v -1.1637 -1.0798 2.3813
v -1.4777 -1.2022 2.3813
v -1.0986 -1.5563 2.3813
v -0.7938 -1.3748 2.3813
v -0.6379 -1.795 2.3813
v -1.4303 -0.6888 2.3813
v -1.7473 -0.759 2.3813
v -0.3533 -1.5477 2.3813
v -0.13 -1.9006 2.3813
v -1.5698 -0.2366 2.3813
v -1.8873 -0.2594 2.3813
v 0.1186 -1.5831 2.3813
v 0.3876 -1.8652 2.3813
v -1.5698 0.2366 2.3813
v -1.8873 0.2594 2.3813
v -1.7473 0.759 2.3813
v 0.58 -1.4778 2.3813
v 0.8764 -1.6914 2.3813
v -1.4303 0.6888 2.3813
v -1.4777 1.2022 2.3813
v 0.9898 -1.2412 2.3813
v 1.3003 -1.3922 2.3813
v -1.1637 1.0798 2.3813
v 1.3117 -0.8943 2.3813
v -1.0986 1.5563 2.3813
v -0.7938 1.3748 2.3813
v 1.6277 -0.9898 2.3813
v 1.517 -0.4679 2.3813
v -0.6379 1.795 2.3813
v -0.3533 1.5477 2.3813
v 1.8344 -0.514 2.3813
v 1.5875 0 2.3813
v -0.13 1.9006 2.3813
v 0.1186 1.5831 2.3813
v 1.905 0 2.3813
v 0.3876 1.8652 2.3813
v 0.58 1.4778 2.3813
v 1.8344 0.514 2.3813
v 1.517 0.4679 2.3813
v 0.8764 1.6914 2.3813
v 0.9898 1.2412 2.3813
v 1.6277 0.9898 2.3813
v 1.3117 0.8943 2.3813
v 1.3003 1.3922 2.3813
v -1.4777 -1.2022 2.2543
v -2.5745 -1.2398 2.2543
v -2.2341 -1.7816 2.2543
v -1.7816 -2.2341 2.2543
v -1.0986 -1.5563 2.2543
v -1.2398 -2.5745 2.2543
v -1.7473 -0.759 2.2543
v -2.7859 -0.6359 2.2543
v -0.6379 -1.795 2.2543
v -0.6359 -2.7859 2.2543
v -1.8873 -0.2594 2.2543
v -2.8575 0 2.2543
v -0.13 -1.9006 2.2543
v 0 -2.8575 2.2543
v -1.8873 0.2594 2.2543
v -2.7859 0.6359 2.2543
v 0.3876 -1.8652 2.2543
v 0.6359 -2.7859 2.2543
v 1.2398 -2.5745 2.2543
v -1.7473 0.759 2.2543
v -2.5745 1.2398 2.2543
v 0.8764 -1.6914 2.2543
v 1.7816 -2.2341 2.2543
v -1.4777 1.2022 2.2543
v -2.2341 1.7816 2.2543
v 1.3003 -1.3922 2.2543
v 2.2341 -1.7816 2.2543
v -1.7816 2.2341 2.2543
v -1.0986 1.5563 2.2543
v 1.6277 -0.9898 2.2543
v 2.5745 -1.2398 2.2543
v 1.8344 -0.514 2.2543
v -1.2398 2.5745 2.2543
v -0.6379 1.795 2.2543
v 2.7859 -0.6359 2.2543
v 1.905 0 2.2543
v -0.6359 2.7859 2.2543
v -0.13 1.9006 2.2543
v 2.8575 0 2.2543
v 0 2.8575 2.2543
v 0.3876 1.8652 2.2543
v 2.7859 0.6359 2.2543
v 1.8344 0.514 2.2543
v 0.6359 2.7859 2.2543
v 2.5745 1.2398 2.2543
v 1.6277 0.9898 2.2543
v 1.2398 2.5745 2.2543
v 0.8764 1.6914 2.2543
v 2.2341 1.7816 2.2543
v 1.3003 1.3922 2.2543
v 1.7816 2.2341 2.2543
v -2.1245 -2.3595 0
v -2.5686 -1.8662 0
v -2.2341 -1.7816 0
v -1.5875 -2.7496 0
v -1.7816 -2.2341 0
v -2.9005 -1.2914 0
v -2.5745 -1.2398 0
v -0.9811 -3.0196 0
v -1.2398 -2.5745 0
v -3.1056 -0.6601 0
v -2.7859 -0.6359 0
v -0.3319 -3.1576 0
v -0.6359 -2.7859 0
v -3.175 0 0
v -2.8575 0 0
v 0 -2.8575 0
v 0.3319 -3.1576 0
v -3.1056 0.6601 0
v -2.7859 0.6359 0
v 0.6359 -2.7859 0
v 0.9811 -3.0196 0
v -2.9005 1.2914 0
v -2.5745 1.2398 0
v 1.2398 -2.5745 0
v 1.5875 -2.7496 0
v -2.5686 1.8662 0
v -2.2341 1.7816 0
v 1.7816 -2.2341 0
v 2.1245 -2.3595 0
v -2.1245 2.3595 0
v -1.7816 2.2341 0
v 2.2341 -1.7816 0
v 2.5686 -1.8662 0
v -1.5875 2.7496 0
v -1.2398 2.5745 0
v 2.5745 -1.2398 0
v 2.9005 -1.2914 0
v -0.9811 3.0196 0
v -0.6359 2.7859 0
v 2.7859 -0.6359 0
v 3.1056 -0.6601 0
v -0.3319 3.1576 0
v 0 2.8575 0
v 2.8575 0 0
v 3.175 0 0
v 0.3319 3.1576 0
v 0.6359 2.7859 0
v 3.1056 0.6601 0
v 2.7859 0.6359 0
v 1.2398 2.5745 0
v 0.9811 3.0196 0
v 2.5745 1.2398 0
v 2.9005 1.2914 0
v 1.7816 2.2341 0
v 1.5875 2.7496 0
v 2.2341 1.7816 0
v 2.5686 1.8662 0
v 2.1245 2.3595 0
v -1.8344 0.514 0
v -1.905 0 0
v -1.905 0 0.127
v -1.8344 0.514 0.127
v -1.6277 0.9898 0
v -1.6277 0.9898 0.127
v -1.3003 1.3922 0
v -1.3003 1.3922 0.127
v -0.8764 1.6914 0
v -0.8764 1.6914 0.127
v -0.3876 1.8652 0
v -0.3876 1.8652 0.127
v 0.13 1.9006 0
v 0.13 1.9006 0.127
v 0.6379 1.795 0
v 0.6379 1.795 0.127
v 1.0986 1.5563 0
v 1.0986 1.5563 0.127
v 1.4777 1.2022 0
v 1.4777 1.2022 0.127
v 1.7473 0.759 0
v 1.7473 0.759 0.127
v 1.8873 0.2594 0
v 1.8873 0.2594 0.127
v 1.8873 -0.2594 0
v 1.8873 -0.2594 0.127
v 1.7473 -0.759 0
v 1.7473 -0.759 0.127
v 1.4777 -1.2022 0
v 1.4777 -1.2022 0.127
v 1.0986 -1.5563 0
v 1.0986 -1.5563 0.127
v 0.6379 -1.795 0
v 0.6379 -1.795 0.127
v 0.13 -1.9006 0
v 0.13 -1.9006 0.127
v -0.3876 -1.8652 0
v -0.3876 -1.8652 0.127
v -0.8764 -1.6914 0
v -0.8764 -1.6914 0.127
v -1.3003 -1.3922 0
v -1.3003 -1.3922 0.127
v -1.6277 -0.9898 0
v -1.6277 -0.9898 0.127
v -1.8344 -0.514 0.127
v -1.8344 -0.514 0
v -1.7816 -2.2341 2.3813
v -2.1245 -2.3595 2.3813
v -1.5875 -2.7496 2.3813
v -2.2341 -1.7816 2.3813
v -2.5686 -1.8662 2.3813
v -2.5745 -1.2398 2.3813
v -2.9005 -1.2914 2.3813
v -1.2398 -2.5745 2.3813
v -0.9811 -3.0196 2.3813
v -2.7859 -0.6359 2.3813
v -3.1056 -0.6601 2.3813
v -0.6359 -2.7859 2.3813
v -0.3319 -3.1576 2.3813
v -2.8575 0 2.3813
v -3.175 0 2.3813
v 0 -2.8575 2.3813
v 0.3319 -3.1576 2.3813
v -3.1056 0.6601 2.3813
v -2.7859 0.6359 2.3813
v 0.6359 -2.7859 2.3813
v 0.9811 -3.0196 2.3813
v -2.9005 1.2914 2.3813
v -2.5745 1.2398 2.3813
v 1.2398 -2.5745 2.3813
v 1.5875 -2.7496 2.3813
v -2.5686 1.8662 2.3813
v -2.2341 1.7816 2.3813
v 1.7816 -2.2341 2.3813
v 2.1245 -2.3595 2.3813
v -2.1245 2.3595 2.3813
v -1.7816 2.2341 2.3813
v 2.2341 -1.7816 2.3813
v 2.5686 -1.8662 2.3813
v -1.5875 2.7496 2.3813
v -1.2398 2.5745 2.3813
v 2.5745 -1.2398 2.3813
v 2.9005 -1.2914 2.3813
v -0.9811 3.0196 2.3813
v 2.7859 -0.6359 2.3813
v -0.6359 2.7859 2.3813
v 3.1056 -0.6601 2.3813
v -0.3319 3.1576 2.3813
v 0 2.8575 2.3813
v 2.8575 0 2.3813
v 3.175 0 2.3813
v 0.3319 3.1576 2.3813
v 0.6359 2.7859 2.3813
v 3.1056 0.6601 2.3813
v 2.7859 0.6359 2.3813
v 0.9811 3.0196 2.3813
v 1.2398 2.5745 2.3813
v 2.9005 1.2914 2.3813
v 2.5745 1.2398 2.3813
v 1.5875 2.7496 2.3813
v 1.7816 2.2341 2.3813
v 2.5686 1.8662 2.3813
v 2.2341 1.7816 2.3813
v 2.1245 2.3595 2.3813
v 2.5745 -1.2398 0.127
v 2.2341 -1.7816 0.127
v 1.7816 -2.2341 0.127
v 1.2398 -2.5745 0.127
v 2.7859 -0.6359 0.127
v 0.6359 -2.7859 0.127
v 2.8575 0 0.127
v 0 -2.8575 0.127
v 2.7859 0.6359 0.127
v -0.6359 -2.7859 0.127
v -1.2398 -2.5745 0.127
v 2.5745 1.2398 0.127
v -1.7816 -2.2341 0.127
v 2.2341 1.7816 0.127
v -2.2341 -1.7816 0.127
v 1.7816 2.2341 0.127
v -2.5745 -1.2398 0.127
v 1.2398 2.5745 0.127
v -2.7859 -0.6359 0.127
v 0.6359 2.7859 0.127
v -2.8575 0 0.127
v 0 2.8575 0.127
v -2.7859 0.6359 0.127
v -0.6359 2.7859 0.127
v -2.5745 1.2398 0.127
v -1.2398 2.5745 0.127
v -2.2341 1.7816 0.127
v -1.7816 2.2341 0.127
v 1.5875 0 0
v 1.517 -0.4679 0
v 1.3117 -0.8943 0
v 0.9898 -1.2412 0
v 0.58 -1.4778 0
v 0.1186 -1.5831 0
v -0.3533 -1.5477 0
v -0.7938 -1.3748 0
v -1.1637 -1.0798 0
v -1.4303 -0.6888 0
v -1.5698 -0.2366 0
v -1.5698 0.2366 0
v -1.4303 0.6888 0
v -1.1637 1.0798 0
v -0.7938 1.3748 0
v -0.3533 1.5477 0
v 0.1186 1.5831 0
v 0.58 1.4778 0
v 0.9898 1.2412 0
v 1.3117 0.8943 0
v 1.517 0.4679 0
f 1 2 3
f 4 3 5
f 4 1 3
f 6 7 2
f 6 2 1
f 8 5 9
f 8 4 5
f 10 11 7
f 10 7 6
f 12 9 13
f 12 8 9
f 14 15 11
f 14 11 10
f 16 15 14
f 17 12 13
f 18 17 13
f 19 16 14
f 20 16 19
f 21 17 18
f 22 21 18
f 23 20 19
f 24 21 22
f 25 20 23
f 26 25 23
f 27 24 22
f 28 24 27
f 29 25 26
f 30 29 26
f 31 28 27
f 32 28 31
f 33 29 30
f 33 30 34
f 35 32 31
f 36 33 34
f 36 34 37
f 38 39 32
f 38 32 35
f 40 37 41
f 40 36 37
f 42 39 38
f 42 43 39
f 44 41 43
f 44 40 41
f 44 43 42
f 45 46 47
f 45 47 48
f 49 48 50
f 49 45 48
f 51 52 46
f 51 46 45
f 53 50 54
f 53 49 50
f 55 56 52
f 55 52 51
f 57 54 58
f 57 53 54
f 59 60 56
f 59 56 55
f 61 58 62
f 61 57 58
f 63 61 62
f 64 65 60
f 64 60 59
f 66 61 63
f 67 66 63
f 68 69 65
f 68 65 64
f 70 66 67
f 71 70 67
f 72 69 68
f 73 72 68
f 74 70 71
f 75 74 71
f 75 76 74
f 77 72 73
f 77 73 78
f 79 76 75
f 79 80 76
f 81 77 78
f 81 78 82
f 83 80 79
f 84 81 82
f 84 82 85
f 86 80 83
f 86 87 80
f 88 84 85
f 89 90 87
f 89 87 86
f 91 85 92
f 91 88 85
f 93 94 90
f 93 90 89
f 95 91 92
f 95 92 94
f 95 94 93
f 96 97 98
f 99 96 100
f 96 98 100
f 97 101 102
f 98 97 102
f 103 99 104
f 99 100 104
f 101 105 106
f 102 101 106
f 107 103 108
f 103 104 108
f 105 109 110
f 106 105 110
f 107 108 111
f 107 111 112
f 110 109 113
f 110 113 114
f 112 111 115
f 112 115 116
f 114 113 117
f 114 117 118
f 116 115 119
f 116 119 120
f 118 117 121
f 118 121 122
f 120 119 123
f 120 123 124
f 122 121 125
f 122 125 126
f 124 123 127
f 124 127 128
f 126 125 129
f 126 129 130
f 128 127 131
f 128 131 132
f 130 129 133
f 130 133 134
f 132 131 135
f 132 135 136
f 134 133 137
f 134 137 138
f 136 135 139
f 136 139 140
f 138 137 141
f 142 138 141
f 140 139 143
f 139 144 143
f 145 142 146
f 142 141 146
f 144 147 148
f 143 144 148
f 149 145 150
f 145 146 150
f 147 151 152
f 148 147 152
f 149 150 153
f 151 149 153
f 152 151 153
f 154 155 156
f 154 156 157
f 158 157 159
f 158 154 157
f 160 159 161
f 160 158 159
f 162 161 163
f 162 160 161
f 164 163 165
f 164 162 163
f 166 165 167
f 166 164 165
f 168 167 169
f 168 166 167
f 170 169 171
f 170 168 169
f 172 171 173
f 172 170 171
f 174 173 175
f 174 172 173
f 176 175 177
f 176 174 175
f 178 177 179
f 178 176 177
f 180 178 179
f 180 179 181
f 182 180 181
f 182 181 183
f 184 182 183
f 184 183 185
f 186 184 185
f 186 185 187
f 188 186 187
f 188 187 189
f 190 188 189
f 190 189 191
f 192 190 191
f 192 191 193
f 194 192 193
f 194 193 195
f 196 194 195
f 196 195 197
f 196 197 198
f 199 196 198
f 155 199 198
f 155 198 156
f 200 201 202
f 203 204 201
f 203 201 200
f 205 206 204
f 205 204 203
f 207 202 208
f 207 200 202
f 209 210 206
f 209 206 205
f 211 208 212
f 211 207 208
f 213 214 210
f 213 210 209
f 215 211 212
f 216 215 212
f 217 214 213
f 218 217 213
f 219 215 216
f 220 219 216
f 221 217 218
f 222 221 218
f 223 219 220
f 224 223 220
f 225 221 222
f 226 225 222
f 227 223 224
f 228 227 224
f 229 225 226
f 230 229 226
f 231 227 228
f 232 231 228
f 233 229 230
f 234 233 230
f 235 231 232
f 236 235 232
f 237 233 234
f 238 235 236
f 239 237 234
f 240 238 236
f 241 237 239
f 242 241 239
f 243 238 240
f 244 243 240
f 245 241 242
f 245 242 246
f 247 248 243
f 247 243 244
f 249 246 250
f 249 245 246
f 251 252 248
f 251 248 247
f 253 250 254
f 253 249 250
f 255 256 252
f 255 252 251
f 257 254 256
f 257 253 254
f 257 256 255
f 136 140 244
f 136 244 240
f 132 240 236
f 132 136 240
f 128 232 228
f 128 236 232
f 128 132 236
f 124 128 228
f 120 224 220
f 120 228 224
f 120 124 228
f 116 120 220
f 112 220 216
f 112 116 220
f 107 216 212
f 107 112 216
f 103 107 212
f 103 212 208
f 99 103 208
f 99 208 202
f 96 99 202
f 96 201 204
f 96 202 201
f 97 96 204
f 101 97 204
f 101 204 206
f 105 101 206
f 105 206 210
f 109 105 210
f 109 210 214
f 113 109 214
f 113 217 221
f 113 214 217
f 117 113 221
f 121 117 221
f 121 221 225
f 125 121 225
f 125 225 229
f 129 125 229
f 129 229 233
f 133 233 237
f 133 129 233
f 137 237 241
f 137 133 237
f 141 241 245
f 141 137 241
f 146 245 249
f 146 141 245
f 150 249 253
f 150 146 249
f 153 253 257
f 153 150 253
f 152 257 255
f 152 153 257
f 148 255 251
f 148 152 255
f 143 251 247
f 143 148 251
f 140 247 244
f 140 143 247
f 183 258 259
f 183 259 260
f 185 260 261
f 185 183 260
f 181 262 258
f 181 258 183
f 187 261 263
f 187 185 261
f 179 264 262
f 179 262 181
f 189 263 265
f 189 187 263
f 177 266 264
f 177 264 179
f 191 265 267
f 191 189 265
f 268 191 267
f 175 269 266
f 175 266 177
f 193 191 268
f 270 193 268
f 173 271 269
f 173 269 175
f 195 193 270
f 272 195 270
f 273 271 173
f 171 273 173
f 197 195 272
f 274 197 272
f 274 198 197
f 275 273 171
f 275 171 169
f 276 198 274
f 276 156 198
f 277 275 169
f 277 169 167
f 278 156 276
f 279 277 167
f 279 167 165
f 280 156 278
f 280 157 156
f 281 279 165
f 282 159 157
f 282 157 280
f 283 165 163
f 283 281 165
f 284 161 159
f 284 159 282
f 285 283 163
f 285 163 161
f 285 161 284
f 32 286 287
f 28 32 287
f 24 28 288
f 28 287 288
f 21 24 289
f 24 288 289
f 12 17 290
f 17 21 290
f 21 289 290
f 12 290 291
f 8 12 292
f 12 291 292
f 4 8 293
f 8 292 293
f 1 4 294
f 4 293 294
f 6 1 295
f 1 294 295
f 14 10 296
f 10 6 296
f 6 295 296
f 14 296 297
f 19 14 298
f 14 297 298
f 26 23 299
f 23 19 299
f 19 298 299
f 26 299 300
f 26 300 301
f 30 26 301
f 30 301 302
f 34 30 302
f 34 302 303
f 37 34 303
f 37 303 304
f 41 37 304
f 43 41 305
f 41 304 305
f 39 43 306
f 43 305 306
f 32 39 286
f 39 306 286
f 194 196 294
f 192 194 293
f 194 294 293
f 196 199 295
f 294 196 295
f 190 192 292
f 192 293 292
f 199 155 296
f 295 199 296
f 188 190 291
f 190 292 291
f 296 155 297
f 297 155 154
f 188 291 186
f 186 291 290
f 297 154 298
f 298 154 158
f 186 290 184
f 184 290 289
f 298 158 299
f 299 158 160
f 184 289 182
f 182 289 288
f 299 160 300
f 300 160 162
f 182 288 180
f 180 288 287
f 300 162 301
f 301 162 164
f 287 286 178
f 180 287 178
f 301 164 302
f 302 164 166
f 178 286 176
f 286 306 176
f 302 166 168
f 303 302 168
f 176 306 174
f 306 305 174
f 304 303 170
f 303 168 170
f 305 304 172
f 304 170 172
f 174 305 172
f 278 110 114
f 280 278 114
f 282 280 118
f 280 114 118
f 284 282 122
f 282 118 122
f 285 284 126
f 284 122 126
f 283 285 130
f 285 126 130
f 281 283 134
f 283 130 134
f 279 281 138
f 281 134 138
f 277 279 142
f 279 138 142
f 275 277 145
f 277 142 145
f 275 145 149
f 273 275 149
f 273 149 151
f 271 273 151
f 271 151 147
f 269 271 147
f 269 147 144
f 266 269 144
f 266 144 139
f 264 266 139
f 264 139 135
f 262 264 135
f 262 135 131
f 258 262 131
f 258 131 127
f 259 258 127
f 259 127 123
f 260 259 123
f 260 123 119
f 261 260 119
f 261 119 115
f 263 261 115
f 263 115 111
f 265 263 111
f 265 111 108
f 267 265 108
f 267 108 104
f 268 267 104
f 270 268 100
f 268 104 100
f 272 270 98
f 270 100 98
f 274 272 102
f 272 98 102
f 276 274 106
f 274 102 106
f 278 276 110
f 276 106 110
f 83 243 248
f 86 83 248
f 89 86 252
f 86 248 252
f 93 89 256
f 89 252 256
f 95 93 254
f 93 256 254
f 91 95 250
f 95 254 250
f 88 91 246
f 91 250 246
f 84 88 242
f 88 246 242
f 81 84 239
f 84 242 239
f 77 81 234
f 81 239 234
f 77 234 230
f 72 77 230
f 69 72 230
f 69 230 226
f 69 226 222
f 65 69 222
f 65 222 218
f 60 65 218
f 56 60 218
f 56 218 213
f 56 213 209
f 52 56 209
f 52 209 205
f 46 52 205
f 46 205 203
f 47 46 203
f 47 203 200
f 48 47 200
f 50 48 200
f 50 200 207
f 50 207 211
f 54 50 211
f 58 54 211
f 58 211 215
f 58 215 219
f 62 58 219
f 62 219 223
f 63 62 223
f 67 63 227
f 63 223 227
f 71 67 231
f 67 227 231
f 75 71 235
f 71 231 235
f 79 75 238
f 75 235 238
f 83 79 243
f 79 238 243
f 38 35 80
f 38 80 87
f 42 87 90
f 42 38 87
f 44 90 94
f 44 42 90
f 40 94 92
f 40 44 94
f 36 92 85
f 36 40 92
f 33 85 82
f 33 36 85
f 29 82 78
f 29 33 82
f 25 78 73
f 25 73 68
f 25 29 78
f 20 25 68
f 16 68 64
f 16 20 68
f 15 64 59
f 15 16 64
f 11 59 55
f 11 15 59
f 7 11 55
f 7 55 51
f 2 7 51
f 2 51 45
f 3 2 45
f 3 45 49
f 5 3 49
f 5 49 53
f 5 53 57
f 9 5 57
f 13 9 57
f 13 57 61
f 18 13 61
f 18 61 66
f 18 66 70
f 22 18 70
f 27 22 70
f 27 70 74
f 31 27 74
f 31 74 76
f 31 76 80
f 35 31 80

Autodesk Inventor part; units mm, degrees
ref_plane "YZ Plane" through (0, 0, 0) normal (1, 0, 0) x (0, 1, 0)
ref_plane "XZ Plane" through (0, 0, 0) normal (0, 1, 0) x (-1, 0, 0)
ref_plane "XY Plane" through (0, 0, 0) normal (0, 0, 1) x (1, 0, 0)
sketch "Sketch1" plane through (0, 0, 0) normal (0, 0, 1) x (1, 0, 0)
  circle A0 centre (0, 0) radius 3.175
  circle A1 centre (0, 0) radius 1.5875
  dimension "d0" = 6.35
  dimension "d1" = 3.175
extrude "Extrusion1" add sketch "Sketch1" along normal blind 2.3813
sketch "Sketch2" plane through (0, 0, 2.3813) normal (0, 0, 1) x (1, 0, 0)
  circle A0 centre (0, 0) radius 1.905
  circle A1 centre (0, 0) radius 2.8575
  dimension "d4" = 3.81
  dimension "d5" = 5.715
extrude "Extrusion2" cut sketch "Sketch2" against normal blind 0.127
sketch "Sketch3" plane through (0, 0, 0) normal (0, 0, -1) x (-1, 0, 0)
  circle A0 centre (0, 0) radius 2.8575 projected
  circle A1 centre (0, 0) radius 1.905 projected
extrude "Extrusion3" cut sketch "Sketch3" against normal blind 0.127
properties part number "bearing_1_8inch" material "Stainless Steel"
